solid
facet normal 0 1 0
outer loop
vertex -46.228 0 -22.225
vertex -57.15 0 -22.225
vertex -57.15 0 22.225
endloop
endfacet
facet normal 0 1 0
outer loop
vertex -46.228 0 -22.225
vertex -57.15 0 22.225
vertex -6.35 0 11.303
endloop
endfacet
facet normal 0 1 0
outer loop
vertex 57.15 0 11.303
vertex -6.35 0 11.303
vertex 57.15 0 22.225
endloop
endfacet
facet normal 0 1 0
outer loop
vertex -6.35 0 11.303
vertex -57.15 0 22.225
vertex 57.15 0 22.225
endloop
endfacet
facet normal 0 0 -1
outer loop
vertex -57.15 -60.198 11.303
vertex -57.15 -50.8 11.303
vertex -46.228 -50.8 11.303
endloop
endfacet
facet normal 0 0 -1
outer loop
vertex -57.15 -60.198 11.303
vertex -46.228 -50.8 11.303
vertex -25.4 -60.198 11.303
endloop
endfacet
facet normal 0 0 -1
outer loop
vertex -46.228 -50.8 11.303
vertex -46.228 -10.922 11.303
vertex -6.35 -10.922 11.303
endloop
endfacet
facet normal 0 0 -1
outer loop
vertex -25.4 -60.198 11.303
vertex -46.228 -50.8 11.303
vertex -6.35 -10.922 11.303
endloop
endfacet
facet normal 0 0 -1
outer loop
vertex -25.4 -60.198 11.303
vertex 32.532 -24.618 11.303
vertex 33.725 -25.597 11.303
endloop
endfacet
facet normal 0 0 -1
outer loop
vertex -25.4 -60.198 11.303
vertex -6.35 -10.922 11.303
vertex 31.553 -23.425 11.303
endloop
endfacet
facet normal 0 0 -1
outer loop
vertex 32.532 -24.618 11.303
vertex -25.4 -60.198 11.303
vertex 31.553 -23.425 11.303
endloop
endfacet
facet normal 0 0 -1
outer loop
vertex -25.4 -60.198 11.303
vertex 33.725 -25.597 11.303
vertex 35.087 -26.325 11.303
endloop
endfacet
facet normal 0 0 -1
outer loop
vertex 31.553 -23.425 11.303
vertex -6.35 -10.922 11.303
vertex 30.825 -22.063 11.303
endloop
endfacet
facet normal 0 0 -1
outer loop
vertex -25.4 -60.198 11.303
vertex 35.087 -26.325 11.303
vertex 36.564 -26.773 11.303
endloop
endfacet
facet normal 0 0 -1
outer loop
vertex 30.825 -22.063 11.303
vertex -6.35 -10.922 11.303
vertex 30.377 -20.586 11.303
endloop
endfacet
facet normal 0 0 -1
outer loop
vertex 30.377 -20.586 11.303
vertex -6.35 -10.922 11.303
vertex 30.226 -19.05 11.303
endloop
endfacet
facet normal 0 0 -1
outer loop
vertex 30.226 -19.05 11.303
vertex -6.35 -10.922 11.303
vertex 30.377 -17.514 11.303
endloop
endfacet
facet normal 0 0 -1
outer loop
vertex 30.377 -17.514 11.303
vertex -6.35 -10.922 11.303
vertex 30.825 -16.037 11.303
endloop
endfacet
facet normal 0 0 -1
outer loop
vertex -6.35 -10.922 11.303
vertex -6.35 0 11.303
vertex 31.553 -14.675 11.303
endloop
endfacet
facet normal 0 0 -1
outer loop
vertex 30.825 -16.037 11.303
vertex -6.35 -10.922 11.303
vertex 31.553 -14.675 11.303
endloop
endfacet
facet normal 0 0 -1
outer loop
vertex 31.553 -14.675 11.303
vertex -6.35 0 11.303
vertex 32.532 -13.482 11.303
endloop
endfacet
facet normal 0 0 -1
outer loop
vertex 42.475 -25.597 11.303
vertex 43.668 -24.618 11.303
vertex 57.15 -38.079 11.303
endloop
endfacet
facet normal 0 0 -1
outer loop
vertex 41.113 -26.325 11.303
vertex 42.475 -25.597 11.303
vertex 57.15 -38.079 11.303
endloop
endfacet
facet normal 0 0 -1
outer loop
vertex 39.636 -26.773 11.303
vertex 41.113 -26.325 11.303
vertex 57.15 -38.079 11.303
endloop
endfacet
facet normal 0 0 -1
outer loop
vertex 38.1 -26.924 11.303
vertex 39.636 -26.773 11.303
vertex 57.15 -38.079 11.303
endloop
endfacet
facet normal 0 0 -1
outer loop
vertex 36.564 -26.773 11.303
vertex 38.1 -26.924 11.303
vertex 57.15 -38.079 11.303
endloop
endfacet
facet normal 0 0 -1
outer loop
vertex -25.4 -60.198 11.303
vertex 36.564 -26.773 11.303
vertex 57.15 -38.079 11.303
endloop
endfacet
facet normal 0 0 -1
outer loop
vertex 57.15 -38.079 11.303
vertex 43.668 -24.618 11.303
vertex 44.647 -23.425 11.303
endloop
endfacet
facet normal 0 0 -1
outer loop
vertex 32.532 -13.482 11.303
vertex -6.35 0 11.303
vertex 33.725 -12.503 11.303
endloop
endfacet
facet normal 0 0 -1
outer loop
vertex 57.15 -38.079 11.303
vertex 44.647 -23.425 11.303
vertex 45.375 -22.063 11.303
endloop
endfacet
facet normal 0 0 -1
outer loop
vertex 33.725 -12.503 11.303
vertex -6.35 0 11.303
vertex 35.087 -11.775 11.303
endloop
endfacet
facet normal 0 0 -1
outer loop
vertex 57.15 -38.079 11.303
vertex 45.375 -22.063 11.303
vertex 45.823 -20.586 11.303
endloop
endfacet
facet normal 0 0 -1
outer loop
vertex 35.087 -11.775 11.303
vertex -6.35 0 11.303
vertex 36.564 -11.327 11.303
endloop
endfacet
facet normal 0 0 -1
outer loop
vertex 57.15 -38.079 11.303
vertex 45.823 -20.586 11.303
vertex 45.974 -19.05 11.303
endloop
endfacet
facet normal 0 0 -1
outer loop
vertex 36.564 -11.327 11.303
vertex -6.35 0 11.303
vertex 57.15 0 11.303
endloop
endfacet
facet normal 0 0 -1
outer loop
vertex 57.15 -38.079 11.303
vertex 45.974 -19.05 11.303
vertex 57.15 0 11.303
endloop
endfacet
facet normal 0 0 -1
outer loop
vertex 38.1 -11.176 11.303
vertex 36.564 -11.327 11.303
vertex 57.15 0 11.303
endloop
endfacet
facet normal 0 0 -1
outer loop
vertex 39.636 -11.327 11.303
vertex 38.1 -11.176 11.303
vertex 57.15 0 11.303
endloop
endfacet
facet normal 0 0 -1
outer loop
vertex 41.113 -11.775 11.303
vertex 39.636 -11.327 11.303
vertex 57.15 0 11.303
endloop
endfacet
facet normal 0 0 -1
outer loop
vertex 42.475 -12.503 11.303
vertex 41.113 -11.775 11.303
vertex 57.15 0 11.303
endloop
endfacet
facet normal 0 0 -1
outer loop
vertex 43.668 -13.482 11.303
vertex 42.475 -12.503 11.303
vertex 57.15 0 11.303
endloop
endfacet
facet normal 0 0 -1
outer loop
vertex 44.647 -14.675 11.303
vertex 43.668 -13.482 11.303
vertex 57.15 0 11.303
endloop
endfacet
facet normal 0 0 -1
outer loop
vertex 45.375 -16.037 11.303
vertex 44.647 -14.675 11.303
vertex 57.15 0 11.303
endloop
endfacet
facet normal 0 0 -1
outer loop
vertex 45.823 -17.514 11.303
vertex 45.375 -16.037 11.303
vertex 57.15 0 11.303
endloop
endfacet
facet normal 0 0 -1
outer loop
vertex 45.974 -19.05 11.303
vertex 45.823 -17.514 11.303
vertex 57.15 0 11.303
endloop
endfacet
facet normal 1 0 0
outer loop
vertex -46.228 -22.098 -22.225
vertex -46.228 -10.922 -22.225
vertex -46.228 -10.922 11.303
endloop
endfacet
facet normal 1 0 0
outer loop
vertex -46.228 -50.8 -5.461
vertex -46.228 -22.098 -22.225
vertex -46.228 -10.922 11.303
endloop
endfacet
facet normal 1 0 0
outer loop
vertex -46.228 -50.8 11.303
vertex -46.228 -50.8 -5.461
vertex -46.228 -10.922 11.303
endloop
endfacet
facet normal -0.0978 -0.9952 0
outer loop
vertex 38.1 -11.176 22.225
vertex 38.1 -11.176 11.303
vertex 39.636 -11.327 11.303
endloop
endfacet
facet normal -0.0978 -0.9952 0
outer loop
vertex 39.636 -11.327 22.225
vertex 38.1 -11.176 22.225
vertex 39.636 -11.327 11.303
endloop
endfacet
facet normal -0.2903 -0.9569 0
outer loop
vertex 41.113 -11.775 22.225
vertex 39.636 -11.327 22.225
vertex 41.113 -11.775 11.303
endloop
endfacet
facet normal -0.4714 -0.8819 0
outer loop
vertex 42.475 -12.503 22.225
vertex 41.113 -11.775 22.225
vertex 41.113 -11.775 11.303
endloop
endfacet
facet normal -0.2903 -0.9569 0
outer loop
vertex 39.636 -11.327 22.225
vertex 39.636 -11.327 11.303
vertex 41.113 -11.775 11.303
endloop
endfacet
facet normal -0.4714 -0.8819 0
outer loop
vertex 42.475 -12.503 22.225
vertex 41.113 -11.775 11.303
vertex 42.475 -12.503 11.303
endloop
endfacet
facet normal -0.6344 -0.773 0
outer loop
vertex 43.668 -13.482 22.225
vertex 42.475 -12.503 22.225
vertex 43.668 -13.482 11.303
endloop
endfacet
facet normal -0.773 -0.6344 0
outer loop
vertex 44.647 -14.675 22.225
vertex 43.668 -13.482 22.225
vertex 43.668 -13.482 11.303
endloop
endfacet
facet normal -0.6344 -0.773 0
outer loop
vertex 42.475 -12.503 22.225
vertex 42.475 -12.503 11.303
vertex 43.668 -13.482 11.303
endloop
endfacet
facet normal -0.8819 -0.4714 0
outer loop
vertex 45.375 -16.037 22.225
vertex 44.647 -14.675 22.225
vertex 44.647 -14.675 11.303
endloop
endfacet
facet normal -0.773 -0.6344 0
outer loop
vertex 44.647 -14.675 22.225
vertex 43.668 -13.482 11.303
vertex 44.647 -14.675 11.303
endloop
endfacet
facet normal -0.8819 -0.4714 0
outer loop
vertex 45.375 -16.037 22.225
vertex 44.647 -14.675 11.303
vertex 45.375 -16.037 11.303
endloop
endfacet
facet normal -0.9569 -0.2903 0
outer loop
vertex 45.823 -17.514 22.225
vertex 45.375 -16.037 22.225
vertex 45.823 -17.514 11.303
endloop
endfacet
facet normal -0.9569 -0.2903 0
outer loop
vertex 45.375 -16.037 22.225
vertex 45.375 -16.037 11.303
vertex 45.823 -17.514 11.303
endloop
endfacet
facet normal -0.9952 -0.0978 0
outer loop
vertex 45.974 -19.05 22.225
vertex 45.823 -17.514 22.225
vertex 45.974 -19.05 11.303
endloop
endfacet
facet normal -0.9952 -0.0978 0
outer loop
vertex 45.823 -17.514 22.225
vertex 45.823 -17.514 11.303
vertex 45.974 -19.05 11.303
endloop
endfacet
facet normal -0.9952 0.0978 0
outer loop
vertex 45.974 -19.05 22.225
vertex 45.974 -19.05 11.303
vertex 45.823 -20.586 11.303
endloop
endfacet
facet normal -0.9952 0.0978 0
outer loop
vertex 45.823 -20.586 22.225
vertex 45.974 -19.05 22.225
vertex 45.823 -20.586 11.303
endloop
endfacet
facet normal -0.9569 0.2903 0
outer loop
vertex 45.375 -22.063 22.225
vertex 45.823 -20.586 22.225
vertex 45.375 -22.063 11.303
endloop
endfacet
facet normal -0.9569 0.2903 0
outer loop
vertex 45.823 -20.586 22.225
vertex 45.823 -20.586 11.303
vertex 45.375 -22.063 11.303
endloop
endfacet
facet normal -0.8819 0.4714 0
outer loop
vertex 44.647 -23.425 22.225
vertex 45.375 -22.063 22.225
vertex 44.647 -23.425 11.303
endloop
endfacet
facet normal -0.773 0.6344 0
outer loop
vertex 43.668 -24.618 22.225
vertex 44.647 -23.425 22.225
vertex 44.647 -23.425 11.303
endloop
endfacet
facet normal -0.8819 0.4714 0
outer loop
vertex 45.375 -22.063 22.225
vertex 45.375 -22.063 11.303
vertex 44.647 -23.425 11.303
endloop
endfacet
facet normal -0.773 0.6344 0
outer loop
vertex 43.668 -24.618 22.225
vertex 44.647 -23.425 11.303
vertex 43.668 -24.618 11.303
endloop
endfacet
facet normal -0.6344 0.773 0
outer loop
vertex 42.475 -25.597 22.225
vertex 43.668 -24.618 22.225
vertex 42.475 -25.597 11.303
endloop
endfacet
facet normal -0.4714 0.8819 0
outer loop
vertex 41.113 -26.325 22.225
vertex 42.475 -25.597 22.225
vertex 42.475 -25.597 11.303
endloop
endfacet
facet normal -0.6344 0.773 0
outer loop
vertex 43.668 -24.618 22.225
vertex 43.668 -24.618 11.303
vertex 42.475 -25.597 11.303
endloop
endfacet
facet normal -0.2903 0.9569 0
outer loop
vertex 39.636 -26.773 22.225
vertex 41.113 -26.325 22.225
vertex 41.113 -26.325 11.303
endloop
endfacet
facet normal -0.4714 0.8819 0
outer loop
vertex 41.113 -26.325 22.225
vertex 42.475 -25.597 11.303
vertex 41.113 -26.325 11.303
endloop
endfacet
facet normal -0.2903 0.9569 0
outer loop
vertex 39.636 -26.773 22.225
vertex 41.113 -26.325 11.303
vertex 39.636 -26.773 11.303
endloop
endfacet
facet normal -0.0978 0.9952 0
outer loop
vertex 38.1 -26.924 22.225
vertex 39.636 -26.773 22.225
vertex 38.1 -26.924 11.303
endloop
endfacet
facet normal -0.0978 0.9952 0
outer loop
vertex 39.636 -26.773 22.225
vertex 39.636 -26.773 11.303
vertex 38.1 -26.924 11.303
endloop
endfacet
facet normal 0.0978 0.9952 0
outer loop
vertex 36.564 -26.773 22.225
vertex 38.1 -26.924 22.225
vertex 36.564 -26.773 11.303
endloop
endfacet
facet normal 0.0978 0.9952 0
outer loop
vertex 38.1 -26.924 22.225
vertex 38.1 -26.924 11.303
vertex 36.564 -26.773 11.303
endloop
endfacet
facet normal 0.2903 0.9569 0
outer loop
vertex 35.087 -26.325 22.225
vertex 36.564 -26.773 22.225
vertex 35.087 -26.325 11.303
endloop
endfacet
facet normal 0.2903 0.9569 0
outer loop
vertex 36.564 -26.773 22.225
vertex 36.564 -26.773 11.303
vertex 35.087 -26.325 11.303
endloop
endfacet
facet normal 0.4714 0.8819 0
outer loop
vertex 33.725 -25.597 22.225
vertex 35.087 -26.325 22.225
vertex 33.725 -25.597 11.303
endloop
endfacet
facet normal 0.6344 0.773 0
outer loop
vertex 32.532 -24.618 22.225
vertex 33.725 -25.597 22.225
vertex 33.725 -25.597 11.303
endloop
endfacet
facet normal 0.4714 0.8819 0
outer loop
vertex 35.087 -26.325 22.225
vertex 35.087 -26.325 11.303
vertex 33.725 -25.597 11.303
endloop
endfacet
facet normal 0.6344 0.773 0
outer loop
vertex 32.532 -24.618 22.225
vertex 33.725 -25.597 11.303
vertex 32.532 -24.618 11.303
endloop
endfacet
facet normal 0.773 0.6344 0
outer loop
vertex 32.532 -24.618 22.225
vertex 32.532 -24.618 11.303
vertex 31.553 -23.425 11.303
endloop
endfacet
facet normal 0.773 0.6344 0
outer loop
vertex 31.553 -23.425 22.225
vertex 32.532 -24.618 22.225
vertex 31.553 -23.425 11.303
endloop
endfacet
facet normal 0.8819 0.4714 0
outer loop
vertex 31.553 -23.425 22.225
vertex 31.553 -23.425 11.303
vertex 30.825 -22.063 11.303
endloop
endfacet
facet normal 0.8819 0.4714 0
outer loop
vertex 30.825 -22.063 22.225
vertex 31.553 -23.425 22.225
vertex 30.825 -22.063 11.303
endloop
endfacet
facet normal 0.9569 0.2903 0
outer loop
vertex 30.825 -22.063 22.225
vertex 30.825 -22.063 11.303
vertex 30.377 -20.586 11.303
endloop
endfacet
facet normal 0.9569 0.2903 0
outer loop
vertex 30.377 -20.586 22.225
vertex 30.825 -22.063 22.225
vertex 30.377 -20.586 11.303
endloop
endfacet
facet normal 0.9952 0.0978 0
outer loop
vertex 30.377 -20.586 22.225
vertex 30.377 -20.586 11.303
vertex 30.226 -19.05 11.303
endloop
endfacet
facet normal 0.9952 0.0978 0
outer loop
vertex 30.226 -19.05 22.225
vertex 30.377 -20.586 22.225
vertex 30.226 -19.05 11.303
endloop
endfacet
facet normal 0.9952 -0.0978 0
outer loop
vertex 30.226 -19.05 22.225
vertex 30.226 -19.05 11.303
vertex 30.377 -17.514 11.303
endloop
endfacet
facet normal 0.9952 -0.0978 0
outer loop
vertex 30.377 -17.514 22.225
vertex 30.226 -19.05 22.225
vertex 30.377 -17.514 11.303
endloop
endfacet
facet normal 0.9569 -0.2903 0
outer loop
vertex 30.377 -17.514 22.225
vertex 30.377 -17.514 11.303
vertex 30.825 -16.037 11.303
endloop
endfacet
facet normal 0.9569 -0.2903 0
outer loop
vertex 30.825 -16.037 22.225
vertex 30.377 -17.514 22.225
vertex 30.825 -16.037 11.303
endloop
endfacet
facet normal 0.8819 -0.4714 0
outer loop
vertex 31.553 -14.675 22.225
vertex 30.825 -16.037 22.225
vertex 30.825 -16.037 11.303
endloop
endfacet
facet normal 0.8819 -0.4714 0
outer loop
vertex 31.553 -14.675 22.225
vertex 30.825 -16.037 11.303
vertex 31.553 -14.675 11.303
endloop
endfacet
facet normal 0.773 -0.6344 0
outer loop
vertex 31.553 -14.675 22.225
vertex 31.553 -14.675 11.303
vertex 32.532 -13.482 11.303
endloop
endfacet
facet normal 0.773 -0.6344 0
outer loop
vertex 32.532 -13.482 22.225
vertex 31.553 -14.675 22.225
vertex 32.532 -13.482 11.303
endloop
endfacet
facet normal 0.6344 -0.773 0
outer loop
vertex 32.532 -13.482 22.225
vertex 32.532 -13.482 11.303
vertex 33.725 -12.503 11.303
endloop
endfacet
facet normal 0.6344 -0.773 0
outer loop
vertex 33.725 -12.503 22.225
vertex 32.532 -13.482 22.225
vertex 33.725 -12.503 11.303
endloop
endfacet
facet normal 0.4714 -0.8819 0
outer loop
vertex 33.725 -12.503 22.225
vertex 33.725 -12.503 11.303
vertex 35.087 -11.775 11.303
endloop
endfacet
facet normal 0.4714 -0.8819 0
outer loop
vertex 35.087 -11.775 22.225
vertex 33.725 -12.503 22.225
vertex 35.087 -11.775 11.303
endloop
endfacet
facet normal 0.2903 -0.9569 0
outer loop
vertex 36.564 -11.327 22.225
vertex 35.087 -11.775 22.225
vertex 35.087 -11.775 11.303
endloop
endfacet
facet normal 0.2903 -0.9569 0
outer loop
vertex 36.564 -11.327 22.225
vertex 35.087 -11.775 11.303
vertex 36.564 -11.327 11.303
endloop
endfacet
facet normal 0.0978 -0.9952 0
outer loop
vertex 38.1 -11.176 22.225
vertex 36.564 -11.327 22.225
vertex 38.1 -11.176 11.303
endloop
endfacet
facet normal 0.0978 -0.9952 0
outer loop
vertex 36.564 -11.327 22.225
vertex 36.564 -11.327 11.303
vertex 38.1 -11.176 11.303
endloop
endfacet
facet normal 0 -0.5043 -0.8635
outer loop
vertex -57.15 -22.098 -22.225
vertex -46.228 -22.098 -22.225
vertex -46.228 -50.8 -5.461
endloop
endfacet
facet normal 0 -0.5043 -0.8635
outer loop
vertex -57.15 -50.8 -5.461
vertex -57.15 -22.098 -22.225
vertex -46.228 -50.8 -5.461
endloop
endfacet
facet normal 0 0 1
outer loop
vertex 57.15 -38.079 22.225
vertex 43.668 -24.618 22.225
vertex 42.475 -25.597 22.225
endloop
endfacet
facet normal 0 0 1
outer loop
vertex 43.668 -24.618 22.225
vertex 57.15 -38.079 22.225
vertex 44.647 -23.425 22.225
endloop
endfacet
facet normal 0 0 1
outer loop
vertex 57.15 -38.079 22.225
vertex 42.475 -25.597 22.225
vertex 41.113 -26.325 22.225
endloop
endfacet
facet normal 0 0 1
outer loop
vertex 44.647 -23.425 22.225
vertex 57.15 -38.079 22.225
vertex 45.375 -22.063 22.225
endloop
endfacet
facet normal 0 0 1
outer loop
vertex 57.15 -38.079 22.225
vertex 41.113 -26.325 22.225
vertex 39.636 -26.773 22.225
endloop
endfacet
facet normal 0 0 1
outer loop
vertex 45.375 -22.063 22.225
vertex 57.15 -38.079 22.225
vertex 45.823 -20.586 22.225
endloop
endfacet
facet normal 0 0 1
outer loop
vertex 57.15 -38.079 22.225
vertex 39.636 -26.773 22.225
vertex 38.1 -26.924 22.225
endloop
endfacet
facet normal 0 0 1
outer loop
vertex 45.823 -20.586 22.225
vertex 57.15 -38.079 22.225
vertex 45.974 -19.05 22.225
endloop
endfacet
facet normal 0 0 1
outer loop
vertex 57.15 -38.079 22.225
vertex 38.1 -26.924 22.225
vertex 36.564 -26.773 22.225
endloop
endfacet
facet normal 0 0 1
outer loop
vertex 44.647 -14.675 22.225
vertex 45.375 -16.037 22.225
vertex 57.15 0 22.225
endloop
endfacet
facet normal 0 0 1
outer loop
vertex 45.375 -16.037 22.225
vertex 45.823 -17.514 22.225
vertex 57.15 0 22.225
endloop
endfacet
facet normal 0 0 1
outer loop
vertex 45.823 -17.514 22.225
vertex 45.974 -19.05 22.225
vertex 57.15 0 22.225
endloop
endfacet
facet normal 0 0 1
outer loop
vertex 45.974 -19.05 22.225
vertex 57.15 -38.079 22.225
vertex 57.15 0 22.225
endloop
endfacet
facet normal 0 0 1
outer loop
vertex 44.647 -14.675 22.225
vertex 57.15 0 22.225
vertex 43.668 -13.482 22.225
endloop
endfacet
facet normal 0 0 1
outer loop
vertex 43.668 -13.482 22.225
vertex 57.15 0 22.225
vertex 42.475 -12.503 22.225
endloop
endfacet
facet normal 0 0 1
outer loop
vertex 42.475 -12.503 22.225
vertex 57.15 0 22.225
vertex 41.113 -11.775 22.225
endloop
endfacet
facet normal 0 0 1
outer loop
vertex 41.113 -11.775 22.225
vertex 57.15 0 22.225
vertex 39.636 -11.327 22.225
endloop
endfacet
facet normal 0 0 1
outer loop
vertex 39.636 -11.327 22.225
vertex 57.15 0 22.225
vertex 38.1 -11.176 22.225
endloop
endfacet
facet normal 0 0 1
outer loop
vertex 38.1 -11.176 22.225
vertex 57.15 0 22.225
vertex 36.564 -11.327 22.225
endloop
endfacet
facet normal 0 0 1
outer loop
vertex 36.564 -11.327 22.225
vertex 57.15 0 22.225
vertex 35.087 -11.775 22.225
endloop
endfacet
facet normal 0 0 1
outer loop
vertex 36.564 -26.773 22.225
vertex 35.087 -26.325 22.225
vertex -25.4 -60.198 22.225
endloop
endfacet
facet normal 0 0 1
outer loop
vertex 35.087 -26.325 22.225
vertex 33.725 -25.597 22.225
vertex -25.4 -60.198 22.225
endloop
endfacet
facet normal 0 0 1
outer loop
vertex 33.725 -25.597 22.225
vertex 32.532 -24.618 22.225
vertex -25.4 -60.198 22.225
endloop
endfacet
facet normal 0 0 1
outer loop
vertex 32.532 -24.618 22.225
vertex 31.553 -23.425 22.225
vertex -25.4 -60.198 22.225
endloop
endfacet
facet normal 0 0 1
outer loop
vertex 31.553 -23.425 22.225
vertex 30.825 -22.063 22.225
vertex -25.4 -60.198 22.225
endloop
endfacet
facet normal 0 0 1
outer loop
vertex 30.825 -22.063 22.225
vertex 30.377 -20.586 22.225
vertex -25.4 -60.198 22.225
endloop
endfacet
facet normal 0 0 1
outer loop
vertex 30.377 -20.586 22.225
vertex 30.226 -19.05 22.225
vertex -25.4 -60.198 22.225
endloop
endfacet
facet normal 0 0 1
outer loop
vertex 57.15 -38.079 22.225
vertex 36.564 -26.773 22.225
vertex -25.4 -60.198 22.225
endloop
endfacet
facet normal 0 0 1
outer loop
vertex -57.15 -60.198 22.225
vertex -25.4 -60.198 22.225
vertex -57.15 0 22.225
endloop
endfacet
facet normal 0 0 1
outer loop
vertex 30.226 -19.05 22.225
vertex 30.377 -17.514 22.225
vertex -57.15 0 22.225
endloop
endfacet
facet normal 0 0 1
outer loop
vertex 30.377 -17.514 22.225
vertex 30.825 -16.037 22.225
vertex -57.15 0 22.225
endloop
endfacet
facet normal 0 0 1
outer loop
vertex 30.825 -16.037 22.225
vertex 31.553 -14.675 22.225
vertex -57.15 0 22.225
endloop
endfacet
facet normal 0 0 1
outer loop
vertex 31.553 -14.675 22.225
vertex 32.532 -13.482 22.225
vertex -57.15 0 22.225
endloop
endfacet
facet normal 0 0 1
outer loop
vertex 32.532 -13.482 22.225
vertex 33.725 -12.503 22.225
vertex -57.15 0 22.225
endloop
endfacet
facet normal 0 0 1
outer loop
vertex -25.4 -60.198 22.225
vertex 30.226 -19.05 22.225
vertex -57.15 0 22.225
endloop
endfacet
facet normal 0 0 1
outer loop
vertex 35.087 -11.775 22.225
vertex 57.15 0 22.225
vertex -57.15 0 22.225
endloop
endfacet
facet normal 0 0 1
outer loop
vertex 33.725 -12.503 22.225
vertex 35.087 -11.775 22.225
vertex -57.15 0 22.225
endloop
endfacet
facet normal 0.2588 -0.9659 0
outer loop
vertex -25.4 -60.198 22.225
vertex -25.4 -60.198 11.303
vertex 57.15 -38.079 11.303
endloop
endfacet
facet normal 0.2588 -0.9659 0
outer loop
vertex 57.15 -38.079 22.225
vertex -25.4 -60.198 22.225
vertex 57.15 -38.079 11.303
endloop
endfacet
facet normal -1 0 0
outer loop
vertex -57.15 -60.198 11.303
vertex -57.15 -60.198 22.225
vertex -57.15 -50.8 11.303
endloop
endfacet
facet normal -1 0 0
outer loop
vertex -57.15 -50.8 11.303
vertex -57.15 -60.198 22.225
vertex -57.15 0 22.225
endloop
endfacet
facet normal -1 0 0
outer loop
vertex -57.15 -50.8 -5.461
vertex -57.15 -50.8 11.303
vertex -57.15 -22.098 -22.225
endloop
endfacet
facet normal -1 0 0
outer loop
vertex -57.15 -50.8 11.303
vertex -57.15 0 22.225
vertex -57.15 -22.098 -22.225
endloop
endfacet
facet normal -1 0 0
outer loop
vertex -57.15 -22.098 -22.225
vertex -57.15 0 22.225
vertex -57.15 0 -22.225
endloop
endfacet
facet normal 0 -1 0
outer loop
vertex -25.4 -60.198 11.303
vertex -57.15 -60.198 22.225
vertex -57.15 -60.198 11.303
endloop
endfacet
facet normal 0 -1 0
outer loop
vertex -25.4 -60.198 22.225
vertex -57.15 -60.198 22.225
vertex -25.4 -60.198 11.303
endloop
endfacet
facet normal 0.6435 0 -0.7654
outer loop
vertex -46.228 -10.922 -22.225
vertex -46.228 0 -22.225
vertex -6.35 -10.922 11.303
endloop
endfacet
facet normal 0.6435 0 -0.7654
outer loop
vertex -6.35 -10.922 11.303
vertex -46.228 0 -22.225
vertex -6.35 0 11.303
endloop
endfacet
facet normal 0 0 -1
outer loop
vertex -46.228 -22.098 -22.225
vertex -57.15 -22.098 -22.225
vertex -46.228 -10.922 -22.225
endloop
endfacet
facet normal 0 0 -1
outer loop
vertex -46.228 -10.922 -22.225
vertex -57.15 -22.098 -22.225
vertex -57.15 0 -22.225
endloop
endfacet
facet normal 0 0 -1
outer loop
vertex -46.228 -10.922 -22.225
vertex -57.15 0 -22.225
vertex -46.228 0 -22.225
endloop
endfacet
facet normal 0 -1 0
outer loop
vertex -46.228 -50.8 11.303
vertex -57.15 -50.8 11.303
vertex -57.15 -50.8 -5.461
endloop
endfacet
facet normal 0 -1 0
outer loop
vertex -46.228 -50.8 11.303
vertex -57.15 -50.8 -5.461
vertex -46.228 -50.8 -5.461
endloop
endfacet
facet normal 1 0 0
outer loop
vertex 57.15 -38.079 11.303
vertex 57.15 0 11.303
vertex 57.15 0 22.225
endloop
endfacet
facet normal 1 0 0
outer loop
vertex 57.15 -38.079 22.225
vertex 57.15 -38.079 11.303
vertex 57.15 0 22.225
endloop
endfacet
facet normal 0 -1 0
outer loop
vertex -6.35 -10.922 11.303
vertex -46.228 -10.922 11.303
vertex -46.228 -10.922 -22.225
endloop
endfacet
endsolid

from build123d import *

# Parameters (mm, degrees)
F1_DEPTH = 10.922
F0_W     = 10.922
F0_H     = 33.528
F2_DEPTH = 50.8
F3_DEPTH = 60.198
F5_DEPTH = 10.923
F7_DEPTH = 10.923


with BuildPart() as f1:
    # F0 (on Front) → F1 (new body)
    with BuildSketch(Plane.XZ):
        Polygon((-46.228, -22.225), (-6.35, 11.303), (-46.228, 11.303), align=None)
    extrude(amount=F1_DEPTH)

    # F0 (on Front) → F2 (join)
    with BuildSketch(Plane.XZ):
        with Locations((-51.689, -5.461)):
            Rectangle(F0_W, F0_H)
    extrude(amount=F2_DEPTH)

    # F0 (on Front) → F3 (join)
    with BuildSketch(Plane.XZ):
        Polygon((57.15, 11.303), (57.15, 22.225), (-57.15, 22.225), (-57.15, 11.303), (-46.228, 11.303), (-6.35, 11.303), align=None)
    extrude(amount=F3_DEPTH)

    # F4 (on face) → F5 (cut, through all)
    with BuildSketch(Plane(origin=(0, 0, 11.303), x_dir=(1, 0, 0), z_dir=(0, 0, -1))):
        with BuildLine():
            ThreePointArc((38.1, 11.176), (43.667759, 13.482241), (45.974, 19.05))
            ThreePointArc((45.974, 19.05), (32.532241, 24.617759), (38.1, 11.176))
        make_face()
        Polygon((57.15, 60.198), (-25.4, 60.198), (57.15, 38.078794), align=None)
    extrude(amount=-F5_DEPTH, mode=Mode.SUBTRACT)

    # F6 (on face) → F7 (cut, through all)
    with BuildSketch(Plane.YZ.offset(-46.228)):
        Polygon((-50.8, -5.461), (-50.8, -22.225), (-22.098, -22.225), align=None)
    extrude(amount=-F7_DEPTH, mode=Mode.SUBTRACT)


solid = f1.part
